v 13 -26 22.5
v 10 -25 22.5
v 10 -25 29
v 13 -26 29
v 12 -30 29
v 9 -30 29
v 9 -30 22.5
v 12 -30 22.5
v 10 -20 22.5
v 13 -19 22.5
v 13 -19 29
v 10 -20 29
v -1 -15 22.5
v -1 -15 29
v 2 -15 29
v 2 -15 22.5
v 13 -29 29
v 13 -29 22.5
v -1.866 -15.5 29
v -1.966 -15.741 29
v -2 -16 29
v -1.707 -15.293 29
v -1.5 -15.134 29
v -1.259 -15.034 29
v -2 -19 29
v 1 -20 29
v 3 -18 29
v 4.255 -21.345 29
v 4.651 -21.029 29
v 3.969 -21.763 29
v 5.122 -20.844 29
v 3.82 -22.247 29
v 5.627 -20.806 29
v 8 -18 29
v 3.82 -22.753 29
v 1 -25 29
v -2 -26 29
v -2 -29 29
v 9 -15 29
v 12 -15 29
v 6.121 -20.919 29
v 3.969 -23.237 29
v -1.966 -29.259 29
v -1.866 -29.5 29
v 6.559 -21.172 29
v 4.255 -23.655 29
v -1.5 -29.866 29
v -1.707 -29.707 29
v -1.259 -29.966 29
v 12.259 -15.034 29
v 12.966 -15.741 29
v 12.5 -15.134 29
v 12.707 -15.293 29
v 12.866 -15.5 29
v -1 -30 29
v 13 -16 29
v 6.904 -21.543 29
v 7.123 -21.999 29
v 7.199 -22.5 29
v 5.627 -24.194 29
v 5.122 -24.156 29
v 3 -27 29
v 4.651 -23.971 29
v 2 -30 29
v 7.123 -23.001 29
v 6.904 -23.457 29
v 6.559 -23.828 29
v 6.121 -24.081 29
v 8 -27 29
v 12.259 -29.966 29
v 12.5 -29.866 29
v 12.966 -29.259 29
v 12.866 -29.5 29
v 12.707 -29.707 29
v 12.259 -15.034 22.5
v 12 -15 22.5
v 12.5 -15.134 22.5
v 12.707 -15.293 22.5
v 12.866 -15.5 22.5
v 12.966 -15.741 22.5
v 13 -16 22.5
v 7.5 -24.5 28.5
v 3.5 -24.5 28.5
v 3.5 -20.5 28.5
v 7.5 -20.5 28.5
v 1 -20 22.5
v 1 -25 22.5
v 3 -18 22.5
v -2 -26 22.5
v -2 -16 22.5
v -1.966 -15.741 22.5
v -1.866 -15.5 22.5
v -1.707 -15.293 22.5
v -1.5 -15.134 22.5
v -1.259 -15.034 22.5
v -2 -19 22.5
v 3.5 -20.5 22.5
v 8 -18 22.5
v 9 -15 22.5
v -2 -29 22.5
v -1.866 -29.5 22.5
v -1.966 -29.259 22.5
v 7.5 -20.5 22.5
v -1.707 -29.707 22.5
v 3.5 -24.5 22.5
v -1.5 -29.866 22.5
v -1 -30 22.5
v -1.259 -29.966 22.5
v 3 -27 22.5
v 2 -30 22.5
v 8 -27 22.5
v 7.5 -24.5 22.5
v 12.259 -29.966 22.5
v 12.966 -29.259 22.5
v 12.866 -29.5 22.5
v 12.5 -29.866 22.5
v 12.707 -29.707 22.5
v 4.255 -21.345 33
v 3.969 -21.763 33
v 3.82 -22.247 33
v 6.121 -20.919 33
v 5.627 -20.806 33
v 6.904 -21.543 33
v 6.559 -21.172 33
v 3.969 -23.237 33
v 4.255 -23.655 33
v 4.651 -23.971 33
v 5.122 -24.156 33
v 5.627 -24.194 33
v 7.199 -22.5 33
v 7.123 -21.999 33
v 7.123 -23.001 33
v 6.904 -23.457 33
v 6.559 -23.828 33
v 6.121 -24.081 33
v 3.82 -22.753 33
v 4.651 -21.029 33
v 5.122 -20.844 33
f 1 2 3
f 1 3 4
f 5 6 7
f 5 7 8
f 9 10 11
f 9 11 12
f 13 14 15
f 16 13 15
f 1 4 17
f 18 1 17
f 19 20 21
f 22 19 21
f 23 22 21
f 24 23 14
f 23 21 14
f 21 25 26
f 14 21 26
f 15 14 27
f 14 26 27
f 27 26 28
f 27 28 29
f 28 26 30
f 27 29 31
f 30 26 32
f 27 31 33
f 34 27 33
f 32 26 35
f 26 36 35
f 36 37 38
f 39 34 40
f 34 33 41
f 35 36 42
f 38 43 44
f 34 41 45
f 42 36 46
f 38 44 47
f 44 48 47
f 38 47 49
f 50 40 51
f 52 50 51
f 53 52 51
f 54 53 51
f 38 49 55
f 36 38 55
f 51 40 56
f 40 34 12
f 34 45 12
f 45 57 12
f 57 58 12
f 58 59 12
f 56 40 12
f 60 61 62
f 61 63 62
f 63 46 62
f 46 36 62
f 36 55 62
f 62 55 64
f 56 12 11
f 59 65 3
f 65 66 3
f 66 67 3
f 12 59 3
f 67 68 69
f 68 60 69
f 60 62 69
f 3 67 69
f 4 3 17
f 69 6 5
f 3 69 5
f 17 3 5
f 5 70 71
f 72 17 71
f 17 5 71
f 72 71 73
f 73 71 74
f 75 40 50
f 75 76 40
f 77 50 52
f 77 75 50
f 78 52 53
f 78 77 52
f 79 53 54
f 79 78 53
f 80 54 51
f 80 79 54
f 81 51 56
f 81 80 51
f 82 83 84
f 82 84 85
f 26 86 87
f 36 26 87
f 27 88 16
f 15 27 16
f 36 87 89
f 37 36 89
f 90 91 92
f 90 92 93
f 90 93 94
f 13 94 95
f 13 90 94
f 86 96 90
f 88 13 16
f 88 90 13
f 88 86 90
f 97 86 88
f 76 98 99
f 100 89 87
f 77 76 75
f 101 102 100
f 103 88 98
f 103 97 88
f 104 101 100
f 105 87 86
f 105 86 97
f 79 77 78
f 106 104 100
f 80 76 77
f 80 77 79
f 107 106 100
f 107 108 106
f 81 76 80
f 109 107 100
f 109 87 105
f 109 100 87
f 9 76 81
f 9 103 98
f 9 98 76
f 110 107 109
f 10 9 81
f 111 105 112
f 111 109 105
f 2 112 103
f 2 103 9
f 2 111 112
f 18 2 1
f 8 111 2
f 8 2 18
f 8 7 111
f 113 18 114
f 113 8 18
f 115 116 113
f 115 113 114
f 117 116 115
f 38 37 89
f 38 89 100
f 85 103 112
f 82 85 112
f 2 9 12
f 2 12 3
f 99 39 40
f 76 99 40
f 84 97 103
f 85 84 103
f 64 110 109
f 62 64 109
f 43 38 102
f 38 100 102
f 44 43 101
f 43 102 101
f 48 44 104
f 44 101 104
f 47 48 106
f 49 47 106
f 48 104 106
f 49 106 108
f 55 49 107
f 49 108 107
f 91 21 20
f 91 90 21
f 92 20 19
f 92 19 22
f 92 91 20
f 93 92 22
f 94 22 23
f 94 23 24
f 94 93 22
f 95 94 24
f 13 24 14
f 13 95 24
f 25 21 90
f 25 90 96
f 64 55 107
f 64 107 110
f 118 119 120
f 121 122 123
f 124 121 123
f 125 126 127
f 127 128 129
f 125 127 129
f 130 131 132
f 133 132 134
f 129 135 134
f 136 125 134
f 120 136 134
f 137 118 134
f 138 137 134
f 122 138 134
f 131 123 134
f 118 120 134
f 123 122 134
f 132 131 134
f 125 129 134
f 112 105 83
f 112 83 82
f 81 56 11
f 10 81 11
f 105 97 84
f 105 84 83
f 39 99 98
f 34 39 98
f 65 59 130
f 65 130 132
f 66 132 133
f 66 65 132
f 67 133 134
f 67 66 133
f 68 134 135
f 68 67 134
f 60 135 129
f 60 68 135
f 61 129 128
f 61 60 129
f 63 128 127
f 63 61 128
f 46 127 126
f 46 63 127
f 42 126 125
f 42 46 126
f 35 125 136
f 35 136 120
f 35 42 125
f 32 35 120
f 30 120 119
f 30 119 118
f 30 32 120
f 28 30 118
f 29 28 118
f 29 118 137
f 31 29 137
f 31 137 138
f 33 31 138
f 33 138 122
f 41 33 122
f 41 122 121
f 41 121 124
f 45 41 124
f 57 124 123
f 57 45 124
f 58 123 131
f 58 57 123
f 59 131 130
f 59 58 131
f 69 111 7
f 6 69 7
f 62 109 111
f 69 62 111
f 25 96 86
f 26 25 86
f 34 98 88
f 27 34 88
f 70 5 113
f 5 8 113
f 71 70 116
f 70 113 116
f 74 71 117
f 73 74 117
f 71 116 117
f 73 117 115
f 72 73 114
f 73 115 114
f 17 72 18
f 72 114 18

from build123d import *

# Parameters (mm, degrees)
SKETCH073_R     = 1.698831
PAD043_DEPTH    = 4
SKETCH074_W     = 15
SKETCH074_H     = 15
PAD044_DEPTH    = 6.5
SKETCH078_W     = 4
SKETCH078_H     = 4
POCKET033_DEPTH = 6
FILLET006_R     = 1
POCKET047_DEPTH = 7


with BuildPart() as part:
    # Sketch073 → Pad043 (new body)
    with BuildSketch(Plane(origin=(0, 0, 25), x_dir=(1, 0, 0), z_dir=(0, 0, -1))):
        with Locations((5.5, 22.5)):
            Circle(SKETCH073_R)
    extrude(amount=-PAD043_DEPTH)

    # Sketch074 (on Face2 of Pad043) → Pad044 (join)
    with BuildSketch(Plane(origin=(0, 0, 25), x_dir=(1, 0, 0), z_dir=(0, 0, -1))):
        with Locations((5.5, 22.5)):
            Rectangle(SKETCH074_W, SKETCH074_H)
    extrude(amount=PAD044_DEPTH)

    # Sketch078 → Pocket033 (cut)
    with BuildSketch(Plane(origin=(0, 0, 18.5), x_dir=(1, 0, 0), z_dir=(0, 0, -1))):
        with Locations((5.5, 22.5)):
            Rectangle(SKETCH078_W, SKETCH078_H)
    extrude(amount=-POCKET033_DEPTH, mode=Mode.SUBTRACT)

    # Fillet006
    fillet006_edges = [part.edges().sort_by_distance(p)[0] for p in [
        (13, -30, 21.75),
        (13, -15, 21.75),
        (-2, -15, 21.75),
        (-2, -30, 21.75),
    ]]
    fillet(fillet006_edges, radius=FILLET006_R)

    # Sketch096 (on Face5 of Fillet006) → Pocket047 (cut)
    with BuildSketch(Plane(origin=(0, 0, 18.5), x_dir=(1, 0, 0), z_dir=(0, 0, -1))):
        Polygon((3, 27), (8, 27), (9, 30), (2, 30), align=None)
        Polygon((1, 25), (-2, 26), (-2, 19), (1, 20), align=None)
        Polygon((3, 18), (2, 15), (9, 15), (8, 18), align=None)
        Polygon((10, 25), (13, 26), (13, 19), (10, 20), align=None)
    extrude(amount=-POCKET047_DEPTH, mode=Mode.SUBTRACT)


with BuildPart() as part_1:
    # Body007 placement: moved
    add(part.part.moved(Location((0, 0, 4))))


solid = part_1.part
